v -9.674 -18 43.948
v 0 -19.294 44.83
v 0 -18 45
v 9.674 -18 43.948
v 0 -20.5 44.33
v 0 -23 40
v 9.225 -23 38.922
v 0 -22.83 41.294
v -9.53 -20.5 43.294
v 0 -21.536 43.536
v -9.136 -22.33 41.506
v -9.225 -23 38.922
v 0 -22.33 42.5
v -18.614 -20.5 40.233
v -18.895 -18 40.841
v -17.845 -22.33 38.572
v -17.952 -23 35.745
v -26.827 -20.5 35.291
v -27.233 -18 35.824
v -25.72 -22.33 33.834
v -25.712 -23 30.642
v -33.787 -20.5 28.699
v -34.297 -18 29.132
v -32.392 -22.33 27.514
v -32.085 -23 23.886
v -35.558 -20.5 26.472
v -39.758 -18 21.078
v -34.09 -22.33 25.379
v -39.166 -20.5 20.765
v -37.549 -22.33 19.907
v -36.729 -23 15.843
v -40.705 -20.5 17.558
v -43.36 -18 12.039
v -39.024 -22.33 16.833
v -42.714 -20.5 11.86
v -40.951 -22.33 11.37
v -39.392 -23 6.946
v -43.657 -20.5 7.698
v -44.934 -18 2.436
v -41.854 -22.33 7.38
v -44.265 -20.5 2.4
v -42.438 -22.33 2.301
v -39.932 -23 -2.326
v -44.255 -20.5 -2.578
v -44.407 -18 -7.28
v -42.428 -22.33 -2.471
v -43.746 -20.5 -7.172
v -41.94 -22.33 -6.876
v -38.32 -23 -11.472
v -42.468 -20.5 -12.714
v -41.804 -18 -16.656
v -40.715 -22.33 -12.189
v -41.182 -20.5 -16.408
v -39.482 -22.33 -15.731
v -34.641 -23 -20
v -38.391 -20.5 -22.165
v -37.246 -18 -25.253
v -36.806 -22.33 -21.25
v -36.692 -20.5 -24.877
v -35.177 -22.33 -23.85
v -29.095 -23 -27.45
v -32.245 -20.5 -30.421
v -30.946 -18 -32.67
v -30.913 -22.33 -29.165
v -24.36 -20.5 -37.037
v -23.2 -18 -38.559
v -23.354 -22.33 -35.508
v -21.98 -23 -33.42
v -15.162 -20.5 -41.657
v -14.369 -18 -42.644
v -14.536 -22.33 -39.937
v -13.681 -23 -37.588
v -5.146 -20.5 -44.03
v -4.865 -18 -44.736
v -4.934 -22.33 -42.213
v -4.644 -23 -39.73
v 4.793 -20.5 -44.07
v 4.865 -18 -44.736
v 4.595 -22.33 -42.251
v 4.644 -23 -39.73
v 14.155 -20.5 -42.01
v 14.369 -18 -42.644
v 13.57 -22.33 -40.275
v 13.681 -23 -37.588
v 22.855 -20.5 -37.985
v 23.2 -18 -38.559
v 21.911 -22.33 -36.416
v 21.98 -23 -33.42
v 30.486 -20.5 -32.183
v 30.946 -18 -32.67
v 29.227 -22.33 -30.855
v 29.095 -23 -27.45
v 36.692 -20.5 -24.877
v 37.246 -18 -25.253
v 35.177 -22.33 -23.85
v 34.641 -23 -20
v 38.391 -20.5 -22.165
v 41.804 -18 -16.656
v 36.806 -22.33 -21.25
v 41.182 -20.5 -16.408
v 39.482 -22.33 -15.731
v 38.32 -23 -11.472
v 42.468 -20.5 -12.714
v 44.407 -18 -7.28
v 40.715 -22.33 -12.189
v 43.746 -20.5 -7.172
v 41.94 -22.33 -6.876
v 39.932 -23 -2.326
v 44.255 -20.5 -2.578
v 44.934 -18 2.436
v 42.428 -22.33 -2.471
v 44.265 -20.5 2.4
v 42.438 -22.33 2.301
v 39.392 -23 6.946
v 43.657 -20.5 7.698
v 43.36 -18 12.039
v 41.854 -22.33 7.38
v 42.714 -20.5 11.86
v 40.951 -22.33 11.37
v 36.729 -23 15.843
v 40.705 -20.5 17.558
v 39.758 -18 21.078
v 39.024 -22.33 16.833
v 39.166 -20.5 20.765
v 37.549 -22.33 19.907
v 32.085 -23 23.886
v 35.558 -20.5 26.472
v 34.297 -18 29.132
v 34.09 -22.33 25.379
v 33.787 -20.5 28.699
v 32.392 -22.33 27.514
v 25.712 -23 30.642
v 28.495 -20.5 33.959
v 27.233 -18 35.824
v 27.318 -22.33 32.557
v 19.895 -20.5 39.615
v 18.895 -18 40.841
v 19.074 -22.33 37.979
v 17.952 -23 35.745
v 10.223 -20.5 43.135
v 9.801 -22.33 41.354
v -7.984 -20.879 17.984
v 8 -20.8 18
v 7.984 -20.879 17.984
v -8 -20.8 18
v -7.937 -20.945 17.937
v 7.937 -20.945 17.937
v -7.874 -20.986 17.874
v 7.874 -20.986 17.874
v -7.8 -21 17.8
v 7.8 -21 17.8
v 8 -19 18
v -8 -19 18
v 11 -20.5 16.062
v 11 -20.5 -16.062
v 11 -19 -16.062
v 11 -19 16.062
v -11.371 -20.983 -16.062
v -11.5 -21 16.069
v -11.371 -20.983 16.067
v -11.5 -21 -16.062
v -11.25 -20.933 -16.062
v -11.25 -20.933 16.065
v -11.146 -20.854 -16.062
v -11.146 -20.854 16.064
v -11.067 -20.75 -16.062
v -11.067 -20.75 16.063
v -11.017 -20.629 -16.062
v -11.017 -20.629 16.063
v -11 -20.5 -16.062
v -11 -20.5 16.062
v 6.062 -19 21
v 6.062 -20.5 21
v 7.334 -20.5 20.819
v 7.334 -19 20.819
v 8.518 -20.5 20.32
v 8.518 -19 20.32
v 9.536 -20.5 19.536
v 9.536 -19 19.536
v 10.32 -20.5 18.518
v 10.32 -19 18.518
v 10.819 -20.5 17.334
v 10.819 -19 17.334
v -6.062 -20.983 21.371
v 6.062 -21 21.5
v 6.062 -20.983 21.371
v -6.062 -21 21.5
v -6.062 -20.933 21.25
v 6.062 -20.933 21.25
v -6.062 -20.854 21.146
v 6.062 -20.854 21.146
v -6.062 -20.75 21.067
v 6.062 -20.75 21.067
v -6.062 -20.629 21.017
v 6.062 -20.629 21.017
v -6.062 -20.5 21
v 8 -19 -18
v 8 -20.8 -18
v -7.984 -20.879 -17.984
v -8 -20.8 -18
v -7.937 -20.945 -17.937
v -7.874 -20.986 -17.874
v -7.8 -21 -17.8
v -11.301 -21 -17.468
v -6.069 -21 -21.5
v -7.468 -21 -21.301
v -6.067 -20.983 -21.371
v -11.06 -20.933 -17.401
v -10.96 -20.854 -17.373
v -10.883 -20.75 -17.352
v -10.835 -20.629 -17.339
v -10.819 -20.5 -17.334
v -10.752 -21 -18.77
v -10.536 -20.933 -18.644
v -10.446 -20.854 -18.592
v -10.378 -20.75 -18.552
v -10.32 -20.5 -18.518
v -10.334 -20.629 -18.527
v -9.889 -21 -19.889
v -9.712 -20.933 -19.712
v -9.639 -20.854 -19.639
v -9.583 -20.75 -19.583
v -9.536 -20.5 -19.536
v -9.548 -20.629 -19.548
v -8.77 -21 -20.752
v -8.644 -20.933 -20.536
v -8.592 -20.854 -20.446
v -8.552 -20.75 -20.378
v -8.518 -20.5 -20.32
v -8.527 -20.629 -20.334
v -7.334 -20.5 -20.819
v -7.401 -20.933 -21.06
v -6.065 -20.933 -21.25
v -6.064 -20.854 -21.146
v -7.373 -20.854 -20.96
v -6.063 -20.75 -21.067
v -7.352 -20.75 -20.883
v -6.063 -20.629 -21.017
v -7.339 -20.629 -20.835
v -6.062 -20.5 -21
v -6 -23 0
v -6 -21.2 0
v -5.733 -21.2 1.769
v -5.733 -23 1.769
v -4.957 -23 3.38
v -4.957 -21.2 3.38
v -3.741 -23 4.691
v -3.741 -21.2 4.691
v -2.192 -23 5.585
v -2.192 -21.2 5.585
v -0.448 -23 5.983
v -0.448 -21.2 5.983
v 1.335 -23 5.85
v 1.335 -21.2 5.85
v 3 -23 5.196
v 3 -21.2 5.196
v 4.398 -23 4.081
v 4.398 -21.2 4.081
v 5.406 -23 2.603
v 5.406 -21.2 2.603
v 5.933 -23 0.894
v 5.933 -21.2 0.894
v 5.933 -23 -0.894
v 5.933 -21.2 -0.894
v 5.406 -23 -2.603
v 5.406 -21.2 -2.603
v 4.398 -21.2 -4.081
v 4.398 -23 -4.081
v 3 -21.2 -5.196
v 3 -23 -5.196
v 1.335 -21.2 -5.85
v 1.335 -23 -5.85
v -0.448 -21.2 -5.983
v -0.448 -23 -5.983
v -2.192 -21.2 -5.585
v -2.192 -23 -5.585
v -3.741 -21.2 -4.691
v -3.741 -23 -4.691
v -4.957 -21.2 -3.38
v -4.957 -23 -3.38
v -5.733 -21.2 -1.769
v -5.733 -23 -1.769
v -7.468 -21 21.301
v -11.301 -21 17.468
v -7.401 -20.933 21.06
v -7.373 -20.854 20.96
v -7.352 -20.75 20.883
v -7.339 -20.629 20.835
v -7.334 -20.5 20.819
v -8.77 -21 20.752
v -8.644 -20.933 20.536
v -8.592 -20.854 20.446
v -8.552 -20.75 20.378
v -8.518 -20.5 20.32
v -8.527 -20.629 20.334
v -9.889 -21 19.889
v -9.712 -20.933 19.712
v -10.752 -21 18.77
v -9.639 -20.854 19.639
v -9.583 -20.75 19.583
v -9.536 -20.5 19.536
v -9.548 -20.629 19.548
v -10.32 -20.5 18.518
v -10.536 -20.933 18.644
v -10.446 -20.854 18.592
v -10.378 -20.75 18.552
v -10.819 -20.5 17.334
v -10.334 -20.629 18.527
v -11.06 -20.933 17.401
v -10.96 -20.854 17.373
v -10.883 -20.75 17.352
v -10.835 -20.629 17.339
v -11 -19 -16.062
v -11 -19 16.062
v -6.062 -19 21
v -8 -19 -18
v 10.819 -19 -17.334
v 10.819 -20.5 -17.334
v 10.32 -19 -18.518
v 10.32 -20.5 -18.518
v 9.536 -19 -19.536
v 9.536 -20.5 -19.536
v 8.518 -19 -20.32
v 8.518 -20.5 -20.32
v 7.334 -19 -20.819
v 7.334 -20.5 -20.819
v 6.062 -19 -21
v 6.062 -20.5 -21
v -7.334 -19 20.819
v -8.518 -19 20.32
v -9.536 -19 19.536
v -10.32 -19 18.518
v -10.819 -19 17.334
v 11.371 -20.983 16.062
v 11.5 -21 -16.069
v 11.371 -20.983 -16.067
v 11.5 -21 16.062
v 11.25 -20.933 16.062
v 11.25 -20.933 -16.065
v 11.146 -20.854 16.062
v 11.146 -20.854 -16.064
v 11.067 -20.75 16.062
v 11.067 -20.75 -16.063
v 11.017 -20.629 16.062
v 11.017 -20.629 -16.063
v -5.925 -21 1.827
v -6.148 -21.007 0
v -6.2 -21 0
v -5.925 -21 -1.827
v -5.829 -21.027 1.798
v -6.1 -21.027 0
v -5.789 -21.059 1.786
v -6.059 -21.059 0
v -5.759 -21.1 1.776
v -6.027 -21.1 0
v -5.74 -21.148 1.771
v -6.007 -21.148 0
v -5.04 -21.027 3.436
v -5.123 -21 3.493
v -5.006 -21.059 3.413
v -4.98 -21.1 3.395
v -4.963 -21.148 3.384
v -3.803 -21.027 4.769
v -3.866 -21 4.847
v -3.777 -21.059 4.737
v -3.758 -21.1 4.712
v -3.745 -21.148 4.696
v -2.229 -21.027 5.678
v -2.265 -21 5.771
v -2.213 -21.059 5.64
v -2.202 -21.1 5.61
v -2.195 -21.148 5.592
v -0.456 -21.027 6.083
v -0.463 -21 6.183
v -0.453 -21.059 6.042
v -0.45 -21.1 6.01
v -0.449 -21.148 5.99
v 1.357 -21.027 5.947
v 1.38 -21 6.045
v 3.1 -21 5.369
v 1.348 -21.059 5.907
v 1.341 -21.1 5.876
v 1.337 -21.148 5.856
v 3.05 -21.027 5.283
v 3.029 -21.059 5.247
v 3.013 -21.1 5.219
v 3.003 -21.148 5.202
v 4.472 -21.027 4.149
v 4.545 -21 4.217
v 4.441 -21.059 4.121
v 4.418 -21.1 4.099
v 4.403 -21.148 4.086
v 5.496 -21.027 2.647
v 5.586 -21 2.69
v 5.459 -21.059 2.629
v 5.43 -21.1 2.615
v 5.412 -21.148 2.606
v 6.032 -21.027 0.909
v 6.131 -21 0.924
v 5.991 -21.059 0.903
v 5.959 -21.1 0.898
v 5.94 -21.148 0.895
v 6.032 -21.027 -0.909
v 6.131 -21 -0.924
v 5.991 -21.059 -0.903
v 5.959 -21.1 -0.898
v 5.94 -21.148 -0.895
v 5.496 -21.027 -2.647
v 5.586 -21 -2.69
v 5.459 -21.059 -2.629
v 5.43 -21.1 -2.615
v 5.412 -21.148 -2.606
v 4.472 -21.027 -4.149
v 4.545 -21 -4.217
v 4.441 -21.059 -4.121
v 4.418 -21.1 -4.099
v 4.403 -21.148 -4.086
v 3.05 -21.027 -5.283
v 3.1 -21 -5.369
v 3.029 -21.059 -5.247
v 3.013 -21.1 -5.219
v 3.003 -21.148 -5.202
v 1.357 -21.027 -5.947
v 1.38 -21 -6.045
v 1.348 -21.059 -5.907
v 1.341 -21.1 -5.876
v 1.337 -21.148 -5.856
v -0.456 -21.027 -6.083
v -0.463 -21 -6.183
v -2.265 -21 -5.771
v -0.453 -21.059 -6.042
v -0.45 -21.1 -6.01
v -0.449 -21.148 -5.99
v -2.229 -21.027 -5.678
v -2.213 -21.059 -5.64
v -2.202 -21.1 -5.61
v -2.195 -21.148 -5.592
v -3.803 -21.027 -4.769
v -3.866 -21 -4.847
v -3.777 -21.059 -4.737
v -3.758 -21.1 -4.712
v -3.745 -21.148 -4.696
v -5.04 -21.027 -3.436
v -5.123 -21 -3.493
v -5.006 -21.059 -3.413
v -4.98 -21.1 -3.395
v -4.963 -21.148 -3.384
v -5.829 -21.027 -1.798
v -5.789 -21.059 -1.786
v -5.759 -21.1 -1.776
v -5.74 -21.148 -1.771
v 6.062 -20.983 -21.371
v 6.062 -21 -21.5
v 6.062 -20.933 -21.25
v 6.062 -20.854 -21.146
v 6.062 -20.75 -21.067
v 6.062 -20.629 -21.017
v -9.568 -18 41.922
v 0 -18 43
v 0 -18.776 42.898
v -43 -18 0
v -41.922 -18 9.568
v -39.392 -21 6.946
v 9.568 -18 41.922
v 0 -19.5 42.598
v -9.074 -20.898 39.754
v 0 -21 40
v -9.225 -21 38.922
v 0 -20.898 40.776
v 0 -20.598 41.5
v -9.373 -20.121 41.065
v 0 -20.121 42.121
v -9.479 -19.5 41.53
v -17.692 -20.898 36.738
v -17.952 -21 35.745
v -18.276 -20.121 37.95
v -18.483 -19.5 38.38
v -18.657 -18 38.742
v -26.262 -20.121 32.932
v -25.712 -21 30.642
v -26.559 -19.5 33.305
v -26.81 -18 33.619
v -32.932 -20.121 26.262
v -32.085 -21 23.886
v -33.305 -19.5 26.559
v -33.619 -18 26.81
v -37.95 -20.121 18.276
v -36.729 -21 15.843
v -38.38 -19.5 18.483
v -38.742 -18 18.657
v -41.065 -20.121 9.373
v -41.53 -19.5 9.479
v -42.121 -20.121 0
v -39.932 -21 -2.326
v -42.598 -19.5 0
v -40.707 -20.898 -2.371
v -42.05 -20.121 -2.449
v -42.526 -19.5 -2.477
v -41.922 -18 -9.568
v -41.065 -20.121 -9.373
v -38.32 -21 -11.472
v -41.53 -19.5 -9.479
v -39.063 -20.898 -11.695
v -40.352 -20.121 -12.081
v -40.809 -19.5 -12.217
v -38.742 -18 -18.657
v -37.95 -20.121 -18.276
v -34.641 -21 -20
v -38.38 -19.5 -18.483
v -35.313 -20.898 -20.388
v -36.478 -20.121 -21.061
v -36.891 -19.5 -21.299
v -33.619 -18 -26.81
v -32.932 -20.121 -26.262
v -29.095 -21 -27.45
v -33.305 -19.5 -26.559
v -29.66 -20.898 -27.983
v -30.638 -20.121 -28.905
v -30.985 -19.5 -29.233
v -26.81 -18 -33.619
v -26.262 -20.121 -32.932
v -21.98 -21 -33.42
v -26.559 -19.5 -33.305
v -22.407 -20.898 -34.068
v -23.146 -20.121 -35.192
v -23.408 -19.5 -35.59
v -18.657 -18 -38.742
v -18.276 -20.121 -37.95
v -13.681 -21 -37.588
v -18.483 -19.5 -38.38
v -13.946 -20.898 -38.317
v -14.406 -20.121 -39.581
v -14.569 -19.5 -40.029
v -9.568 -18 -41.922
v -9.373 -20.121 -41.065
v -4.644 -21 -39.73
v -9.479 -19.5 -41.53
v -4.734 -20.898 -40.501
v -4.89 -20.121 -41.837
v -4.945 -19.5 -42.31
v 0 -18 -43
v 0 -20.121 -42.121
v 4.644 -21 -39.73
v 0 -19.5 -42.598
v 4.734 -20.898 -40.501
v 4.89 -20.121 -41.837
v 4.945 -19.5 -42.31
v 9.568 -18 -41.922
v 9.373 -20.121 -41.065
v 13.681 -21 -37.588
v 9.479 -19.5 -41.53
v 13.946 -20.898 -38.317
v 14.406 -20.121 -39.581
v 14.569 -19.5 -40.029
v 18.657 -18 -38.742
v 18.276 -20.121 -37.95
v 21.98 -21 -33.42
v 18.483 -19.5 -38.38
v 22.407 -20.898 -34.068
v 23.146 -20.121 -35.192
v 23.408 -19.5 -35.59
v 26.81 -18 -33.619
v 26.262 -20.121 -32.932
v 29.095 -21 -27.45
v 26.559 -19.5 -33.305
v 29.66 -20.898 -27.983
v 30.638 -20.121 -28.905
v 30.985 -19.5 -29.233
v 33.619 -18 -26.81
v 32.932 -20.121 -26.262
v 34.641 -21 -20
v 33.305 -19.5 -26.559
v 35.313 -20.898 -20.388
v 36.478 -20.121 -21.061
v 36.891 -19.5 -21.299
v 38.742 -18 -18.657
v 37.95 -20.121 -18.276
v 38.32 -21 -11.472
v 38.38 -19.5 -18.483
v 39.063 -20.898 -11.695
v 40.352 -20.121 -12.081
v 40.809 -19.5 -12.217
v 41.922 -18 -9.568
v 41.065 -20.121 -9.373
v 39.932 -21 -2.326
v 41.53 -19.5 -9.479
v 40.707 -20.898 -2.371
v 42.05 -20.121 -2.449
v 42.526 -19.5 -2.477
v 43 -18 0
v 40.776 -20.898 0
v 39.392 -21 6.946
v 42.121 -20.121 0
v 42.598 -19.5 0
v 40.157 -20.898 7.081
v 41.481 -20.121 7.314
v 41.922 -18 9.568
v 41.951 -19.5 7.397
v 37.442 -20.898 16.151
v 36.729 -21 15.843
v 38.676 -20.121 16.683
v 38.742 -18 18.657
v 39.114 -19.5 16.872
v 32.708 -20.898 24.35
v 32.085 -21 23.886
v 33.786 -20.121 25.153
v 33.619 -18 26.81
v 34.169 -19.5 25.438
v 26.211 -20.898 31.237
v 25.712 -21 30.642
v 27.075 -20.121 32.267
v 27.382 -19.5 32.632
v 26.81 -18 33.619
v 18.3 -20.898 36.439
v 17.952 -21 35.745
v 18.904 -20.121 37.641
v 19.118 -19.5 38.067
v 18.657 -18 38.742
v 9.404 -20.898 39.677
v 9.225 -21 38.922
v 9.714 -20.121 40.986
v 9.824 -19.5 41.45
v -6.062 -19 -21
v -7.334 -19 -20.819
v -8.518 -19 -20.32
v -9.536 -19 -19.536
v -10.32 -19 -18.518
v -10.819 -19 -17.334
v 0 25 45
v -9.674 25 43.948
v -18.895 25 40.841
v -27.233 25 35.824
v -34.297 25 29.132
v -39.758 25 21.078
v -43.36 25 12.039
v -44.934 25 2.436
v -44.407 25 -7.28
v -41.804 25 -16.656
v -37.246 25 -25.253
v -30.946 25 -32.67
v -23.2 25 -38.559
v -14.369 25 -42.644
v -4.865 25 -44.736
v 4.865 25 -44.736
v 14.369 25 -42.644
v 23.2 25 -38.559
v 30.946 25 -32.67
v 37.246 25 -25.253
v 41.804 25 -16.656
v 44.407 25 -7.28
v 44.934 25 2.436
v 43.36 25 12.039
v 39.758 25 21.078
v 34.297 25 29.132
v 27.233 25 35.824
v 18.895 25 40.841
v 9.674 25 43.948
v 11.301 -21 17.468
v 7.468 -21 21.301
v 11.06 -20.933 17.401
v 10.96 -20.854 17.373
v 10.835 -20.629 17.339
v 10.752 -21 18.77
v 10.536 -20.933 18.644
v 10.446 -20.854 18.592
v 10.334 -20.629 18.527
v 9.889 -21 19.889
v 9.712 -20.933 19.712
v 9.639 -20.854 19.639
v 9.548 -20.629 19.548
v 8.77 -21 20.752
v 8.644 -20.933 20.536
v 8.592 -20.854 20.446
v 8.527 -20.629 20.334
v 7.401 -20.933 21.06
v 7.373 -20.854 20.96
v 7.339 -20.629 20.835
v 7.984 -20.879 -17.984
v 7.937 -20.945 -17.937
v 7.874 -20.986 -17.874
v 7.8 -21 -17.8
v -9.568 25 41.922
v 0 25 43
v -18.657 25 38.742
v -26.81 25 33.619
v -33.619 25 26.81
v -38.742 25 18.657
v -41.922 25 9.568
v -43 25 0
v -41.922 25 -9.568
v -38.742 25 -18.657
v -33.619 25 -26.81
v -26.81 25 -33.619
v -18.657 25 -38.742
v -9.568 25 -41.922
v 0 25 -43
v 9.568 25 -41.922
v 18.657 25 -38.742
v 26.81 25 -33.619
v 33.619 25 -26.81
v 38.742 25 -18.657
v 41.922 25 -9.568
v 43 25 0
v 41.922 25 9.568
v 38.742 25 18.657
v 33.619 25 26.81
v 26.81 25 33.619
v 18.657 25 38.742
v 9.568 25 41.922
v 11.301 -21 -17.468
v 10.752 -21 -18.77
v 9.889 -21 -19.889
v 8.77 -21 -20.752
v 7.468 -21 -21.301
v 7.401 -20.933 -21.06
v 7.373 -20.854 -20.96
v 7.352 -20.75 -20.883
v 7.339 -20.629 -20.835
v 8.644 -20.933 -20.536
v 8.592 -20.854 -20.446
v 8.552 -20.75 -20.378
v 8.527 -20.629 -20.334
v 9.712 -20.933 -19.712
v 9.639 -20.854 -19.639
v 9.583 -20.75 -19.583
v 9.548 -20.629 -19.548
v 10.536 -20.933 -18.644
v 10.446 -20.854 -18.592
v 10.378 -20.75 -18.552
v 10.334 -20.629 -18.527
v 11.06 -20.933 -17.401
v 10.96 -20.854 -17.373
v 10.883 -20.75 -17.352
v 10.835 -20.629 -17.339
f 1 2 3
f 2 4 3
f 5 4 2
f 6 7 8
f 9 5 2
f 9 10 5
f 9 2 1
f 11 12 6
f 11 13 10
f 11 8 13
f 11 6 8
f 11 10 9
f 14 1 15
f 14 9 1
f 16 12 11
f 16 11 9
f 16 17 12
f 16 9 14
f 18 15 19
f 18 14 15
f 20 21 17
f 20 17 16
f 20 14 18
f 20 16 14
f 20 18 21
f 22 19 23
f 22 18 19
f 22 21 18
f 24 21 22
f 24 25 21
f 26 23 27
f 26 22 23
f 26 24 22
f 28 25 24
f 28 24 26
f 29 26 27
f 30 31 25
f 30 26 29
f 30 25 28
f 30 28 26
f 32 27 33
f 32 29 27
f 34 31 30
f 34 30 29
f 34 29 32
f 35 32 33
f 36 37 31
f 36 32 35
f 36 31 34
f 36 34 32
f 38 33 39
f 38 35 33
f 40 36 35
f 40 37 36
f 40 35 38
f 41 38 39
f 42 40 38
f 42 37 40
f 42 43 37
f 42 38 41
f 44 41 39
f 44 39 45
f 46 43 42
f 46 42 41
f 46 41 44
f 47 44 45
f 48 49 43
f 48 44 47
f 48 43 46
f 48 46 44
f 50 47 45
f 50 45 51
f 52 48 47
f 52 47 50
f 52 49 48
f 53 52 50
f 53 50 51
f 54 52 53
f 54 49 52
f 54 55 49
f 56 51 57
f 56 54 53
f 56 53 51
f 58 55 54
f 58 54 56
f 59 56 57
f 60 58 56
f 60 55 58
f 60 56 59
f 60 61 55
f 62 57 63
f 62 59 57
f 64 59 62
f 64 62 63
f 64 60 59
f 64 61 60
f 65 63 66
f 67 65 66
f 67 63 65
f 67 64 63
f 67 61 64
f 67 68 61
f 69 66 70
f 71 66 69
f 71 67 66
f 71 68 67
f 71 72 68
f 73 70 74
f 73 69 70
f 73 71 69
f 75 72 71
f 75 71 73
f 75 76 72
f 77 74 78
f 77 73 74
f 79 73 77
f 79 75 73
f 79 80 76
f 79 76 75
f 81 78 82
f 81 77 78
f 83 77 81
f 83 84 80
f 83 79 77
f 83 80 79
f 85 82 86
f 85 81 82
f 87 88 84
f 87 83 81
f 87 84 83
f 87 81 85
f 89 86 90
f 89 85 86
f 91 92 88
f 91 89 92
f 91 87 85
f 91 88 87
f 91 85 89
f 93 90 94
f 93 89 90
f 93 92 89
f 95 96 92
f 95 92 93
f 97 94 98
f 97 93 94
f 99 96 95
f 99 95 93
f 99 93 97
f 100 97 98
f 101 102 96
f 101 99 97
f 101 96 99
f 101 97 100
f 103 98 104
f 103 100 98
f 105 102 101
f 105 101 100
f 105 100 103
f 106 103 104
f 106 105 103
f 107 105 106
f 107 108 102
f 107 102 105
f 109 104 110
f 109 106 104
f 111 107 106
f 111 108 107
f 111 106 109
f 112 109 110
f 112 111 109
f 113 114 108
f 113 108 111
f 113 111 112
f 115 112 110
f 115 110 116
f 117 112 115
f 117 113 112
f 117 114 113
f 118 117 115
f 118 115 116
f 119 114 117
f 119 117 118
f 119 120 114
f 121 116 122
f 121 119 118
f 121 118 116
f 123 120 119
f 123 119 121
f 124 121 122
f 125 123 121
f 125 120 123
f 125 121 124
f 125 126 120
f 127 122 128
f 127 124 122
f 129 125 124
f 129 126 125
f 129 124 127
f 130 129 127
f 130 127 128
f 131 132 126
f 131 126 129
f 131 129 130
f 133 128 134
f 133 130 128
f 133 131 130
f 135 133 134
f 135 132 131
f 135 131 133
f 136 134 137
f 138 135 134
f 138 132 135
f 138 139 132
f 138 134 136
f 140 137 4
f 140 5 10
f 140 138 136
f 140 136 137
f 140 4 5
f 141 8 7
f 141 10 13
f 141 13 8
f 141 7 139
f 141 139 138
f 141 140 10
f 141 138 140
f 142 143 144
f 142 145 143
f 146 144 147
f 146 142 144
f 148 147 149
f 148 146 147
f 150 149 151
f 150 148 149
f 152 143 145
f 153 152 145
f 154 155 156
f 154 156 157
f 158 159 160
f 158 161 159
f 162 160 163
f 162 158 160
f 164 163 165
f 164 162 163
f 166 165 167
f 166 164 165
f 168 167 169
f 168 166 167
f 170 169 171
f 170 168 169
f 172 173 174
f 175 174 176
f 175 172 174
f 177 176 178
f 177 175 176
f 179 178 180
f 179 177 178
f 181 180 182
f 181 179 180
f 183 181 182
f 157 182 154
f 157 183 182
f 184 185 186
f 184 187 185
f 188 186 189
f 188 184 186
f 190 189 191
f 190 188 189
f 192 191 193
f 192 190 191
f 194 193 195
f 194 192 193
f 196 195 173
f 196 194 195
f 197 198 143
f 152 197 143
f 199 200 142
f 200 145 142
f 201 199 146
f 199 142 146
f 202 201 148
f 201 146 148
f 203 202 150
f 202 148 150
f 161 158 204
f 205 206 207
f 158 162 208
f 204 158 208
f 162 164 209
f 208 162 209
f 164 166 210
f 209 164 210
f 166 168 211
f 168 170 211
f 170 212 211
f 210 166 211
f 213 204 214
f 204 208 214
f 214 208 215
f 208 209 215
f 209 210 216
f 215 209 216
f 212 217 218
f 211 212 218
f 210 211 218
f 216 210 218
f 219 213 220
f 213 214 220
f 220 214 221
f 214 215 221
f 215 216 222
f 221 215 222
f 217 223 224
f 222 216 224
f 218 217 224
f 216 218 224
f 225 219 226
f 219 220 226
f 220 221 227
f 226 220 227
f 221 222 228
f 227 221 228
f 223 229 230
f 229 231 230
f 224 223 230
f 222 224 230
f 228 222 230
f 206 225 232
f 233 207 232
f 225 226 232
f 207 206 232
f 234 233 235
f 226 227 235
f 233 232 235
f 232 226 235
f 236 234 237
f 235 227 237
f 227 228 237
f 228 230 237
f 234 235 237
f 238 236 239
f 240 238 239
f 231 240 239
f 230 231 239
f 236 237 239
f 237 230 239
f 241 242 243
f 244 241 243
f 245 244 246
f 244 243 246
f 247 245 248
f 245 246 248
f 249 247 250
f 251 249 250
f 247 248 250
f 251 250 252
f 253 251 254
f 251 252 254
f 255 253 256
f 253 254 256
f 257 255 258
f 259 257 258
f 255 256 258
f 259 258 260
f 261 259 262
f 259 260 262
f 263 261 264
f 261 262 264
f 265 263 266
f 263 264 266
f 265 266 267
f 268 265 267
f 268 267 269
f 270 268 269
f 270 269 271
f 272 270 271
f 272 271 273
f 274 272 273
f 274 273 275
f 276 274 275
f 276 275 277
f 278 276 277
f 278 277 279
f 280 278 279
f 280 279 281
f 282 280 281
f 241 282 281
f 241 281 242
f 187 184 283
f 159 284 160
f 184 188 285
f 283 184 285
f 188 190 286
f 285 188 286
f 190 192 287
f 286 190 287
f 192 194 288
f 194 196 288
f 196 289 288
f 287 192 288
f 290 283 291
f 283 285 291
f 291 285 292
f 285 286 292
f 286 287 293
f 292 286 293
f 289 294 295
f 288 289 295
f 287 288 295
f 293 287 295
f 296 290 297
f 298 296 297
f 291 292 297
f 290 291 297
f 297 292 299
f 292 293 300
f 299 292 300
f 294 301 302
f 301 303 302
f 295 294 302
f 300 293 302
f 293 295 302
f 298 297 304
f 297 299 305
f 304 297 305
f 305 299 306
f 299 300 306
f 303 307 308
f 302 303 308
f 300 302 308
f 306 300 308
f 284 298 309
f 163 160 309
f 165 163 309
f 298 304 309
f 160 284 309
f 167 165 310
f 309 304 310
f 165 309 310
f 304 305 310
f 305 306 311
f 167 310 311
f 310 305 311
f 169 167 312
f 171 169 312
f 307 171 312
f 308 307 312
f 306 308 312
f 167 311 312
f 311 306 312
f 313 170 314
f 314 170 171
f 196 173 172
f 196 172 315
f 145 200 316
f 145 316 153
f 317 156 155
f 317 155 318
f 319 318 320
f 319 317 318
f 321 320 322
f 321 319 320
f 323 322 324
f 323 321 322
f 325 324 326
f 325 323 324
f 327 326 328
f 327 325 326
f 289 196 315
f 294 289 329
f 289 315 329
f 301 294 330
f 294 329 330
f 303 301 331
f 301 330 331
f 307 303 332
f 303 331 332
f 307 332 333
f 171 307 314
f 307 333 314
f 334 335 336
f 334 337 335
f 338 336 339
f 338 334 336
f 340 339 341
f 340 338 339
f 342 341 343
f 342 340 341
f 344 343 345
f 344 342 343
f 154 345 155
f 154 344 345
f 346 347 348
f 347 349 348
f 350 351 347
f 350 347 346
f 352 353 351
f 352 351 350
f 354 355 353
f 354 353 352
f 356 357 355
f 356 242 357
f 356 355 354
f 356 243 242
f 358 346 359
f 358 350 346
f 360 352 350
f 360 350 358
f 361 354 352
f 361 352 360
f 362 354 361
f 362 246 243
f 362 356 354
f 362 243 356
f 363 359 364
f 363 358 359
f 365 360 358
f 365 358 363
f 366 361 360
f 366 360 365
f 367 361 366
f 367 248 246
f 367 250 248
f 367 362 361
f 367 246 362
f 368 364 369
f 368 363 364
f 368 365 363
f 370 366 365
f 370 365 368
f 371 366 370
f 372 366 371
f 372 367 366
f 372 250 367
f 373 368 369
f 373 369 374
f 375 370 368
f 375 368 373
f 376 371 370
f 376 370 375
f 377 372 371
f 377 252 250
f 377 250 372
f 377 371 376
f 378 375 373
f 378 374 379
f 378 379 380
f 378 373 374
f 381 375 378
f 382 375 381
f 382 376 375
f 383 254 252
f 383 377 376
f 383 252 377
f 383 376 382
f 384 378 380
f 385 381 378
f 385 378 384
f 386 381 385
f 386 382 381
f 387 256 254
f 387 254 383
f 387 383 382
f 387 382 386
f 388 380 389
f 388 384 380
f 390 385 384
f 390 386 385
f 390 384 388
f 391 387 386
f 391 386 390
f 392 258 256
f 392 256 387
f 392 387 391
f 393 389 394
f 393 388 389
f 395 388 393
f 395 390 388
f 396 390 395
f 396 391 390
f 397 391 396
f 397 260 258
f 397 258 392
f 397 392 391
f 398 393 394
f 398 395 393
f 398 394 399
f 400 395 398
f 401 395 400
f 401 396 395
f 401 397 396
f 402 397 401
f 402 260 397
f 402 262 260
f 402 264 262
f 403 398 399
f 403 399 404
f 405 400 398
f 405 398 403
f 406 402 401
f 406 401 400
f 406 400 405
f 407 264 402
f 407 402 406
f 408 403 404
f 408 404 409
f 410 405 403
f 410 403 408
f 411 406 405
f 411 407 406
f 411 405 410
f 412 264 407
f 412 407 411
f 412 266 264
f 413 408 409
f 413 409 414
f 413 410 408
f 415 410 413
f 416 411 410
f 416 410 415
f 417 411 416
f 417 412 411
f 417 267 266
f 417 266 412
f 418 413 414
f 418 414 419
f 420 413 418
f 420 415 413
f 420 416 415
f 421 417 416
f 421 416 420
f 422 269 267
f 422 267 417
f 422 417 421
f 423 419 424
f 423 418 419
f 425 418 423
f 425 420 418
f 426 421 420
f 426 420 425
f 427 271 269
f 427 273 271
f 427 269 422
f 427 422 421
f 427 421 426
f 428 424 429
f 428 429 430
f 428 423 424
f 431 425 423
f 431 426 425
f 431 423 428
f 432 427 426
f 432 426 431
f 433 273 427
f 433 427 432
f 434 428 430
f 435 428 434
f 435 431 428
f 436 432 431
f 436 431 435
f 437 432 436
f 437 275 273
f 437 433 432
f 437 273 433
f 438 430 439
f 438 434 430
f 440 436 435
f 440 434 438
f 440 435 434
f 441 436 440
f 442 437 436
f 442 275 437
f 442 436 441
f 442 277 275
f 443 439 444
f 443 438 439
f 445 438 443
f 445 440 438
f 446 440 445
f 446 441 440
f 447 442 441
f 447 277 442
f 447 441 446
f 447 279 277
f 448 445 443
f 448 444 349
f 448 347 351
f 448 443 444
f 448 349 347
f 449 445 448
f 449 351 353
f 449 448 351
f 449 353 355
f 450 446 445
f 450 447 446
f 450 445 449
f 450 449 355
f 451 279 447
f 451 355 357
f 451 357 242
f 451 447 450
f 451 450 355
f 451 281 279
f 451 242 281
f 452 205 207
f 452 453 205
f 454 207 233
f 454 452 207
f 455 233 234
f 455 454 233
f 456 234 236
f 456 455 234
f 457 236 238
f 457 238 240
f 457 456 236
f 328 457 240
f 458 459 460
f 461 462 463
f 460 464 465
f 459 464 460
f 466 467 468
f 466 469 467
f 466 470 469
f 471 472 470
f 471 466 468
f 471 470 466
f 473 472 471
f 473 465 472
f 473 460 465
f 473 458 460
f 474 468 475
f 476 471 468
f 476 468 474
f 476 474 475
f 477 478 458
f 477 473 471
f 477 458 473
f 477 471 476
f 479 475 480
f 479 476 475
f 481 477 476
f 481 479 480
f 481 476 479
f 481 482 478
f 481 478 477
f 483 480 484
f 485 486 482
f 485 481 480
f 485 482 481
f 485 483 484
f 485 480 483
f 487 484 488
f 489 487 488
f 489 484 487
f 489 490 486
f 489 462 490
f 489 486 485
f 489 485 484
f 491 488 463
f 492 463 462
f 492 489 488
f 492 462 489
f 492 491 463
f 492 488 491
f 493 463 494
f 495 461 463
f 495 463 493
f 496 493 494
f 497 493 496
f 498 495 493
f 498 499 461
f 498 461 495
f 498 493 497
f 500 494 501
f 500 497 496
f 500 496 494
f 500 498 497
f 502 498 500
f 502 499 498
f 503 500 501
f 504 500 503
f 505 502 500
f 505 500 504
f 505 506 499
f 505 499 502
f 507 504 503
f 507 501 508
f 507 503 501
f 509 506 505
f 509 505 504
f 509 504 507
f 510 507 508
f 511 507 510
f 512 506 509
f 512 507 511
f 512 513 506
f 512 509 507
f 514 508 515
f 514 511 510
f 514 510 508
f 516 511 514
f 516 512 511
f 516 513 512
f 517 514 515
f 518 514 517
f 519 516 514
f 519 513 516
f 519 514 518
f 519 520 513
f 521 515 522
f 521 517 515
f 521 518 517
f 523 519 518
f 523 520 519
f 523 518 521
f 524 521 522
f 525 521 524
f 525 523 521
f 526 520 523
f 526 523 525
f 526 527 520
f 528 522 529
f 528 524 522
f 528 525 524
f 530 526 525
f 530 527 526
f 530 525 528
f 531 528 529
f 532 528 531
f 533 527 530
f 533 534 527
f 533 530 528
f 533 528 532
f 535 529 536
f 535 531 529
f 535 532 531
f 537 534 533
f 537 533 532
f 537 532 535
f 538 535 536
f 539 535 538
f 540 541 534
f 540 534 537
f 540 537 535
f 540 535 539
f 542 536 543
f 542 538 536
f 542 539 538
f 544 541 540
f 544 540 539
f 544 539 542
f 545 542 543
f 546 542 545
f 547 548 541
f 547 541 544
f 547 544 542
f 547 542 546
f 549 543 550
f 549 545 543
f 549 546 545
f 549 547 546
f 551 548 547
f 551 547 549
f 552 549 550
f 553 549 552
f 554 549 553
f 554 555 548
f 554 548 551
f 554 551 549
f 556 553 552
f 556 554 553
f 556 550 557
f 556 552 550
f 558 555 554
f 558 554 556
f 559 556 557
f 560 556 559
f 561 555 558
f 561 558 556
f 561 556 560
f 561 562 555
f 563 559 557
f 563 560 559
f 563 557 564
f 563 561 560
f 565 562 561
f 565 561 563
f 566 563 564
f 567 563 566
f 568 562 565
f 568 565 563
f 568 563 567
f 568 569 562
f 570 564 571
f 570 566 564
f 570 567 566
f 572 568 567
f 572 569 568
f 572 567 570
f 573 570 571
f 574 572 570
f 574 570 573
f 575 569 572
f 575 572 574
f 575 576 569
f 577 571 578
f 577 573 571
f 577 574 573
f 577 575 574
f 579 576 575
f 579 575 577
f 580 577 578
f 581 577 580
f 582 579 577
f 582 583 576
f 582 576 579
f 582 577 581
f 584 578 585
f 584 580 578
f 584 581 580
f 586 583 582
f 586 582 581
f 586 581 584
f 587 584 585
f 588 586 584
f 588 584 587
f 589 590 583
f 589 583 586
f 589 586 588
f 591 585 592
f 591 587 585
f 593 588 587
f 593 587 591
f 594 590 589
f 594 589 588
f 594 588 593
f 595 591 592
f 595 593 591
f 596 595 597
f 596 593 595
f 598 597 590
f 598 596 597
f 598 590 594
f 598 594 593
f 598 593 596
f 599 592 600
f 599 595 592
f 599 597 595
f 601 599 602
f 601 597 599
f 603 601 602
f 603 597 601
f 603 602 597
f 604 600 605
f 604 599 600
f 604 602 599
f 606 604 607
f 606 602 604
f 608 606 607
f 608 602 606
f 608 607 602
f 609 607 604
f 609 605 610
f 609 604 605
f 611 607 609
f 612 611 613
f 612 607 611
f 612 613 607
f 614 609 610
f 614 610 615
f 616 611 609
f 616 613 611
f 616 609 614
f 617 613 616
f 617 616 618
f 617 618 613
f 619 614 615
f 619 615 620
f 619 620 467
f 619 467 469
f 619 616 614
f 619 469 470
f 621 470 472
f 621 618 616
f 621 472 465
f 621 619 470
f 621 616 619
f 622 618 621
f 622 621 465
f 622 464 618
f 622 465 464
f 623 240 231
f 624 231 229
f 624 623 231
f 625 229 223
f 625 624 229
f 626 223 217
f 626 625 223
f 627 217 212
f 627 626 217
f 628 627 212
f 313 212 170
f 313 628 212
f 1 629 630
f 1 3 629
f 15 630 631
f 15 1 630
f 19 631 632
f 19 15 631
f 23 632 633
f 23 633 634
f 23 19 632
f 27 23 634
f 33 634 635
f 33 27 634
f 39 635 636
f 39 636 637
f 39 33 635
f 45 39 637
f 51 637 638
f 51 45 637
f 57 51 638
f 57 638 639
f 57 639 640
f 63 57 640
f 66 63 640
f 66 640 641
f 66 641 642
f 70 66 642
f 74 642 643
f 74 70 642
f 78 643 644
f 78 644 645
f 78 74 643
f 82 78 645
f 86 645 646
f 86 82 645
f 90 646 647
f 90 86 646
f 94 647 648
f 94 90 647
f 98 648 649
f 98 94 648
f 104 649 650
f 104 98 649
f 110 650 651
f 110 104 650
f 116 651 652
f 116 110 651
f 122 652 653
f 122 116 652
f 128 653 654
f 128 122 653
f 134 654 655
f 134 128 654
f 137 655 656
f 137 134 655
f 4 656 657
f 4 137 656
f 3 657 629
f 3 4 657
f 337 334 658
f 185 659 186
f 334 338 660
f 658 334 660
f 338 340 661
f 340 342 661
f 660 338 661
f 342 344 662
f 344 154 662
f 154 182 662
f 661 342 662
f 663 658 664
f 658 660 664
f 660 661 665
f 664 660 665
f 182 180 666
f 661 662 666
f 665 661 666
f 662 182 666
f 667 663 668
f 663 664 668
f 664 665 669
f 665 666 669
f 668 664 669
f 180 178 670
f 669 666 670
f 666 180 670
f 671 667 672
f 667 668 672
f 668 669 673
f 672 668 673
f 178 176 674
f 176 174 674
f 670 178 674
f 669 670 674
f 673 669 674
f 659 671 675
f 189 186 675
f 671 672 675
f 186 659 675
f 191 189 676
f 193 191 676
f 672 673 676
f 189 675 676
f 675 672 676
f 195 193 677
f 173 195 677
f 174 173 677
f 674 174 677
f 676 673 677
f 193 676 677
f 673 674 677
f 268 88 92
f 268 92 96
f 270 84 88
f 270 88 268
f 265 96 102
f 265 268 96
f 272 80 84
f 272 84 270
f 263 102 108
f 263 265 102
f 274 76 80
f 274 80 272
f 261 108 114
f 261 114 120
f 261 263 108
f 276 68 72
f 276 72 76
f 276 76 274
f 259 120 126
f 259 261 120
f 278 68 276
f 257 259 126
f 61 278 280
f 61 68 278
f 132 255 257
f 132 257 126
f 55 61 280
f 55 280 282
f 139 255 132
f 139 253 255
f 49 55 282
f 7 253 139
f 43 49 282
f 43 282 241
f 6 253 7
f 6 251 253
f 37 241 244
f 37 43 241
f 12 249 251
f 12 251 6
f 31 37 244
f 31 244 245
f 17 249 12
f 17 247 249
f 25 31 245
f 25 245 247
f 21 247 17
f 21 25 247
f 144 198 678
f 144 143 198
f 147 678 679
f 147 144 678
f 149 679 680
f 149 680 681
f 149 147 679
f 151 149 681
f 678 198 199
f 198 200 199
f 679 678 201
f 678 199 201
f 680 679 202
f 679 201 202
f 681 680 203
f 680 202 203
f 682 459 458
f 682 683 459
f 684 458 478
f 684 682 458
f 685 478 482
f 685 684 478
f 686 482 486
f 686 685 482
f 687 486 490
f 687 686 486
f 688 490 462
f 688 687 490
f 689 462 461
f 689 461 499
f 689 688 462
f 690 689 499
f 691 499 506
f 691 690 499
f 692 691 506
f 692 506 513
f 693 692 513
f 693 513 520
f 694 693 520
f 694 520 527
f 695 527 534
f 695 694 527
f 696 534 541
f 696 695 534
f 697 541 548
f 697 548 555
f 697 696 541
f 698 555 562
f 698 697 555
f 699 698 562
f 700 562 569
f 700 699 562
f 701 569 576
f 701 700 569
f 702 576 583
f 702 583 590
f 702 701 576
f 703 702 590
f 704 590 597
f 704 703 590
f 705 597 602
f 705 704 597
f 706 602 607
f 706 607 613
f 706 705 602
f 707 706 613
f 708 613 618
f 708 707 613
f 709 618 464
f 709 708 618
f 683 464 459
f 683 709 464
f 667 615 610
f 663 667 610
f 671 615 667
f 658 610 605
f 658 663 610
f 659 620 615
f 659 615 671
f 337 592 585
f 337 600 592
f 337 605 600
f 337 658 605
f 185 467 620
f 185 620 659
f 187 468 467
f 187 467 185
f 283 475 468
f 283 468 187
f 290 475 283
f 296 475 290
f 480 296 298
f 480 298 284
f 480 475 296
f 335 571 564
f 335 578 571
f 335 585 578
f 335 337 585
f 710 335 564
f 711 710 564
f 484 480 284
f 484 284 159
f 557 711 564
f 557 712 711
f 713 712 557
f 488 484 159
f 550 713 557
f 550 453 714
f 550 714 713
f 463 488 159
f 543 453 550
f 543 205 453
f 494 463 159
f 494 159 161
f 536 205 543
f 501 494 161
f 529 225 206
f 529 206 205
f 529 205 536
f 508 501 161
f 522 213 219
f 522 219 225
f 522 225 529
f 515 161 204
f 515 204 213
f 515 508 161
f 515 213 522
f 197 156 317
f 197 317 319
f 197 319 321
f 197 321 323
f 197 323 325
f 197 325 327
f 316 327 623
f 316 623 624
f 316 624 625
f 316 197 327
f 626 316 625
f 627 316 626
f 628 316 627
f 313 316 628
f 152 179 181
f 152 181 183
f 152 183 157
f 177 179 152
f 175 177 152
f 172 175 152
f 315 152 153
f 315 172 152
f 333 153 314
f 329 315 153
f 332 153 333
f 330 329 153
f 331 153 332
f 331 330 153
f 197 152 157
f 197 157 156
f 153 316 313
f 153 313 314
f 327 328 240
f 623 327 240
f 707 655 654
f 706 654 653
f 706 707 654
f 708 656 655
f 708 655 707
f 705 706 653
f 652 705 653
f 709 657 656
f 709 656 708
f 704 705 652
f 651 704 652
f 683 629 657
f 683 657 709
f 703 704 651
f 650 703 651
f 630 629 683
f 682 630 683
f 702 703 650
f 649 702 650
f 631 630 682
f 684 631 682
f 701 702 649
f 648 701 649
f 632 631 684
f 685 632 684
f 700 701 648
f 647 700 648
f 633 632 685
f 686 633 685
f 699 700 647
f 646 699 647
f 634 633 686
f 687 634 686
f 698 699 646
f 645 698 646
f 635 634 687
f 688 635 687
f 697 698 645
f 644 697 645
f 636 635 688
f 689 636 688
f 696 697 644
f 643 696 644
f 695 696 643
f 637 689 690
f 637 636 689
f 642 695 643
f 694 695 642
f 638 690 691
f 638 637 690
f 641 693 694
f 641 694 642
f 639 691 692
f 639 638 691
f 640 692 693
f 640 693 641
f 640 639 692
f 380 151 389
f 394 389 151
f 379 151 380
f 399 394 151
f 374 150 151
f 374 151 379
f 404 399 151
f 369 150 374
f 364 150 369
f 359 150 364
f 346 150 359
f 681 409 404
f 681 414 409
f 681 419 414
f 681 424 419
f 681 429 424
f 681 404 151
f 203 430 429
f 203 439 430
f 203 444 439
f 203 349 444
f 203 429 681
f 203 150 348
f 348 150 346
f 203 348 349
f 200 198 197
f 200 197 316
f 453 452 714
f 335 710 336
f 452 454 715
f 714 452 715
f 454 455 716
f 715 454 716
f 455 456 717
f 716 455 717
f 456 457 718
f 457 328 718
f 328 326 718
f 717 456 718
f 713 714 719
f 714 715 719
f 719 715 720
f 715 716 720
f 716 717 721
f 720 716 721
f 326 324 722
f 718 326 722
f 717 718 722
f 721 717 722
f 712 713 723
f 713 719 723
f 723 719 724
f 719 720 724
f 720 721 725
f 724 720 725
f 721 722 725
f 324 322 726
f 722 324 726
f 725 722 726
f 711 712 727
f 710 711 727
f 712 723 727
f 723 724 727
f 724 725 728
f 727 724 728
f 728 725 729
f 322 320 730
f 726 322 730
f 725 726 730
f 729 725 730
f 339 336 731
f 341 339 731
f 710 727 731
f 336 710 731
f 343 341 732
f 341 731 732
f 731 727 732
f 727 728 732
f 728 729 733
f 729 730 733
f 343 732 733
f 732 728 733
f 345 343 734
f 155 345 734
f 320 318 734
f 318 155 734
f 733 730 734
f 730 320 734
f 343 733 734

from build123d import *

# Parameters (mm, degrees)
F2_W        = 22
F2_H        = 42
F2_W_2      = 16
F2_H_2      = 36
F3_DEPTH    = 2
F2_R        = 6
F4_DEPTH    = 25
F5_T1_DEPTH = 14.5024142536
F6_R        = 0.5
F7_R        = 0.2


# Not quite as in the source:
# - a fillet or chamfer that OpenCascade refuses, or shapes differently, is made with other operations: its cross-section is extruded or revolved along the edge and cut away or added


with BuildPart() as f1:
    # F0 (on Right) → F1 (revolve)
    with BuildSketch(Plane.YZ):
        with BuildLine():
            Line((-23, 0), (-21, 0))
            Line((-21, 0), (-21, 32.1))
            Line((-21, 32.1), (-21, 34.1))
            Line((-21, 34.1), (-21, 40))
            ThreePointArc((-21, 40), (-20.1213203436, 42.1213203436), (-18, 43))
            Line((-18, 43), (15, 43))
            Line((15, 43), (17, 43))
            Line((17, 43), (23, 43))
            Line((23, 43), (25, 43))
            Line((25, 43), (25, 45))
            Line((25, 45), (-18, 45))
            ThreePointArc((-18, 45), (-21.5355339059, 43.5355339059), (-23, 40))
            Line((-23, 40), (-23, 0))
        make_face()
    revolve(axis=Axis((0, -22, 0), (0, -1, 0)))

    # F2 (on face) → F3 (join)
    with BuildSketch(Plane(origin=(0, -21, 0), x_dir=(-1, 0, 0), z_dir=(0, 1, 0))):
        Rectangle(F2_W, F2_H)
        Rectangle(F2_W_2, F2_H_2, mode=Mode.SUBTRACT)
    extrude(amount=F3_DEPTH)

    # F2 (on face) → F4 (cut)
    with BuildSketch(Plane(origin=(0, -21, 0), x_dir=(-1, 0, 0), z_dir=(0, 1, 0))):
        Circle(F2_R)
    extrude(amount=-F4_DEPTH, mode=Mode.SUBTRACT)

    # F5: fillet of radius 5 on 4 edges, made by hand

    # F5_s2 → F5_t1 (cut)
    with BuildSketch(Plane.XZ.offset(6.4975857464)):
        with BuildLine():
            ThreePointArc((5.9990343146, 21.0004), (9.5355339059, 19.5355339059), (11.0004, 15.9990343146))
            Line((11.0004, 15.9990343146), (11.5005365685, 15.9990343146))
            ThreePointArc((11.5005365685, 15.9990343146), (11.5001365685, 18.4995171573), (11.5001365685, 21))
            Line((11.5001365685, 21), (11, 21.5001365685))
            ThreePointArc((11, 21.5001365685), (8.4995171573, 21.5001365685), (5.9990343146, 21.5005365685))
            Line((5.9990343146, 21.5005365685), (5.9990343146, 21.0004))
        make_face()
        with BuildLine():
            ThreePointArc((-5.9990343146, 21.0004), (-9.5355339059, 19.5355339059), (-11.0004, 15.9990343146))
            Line((-11.0004, 15.9990343146), (-11.5005365685, 15.9990343146))
            ThreePointArc((-11.5005365685, 15.9990343146), (-11.5001365685, 18.4995171573), (-11.5001365685, 21))
            Line((-11.5001365685, 21), (-11, 21.5001365685))
            ThreePointArc((-11, 21.5001365685), (-8.4995171573, 21.5001365685), (-5.9990343146, 21.5005365685))
            Line((-5.9990343146, 21.5005365685), (-5.9990343146, 21.0004))
        make_face()
        with BuildLine():
            ThreePointArc((-5.9990343146, -21.0004), (-9.5355339059, -19.5355339059), (-11.0004, -15.9990343146))
            Line((-11.0004, -15.9990343146), (-11.5005365685, -15.9990343146))
            ThreePointArc((-11.5005365685, -15.9990343146), (-11.5001365685, -18.4995171573), (-11.5001365685, -21))
            Line((-11.5001365685, -21), (-11, -21.5001365685))
            ThreePointArc((-11, -21.5001365685), (-8.4995171573, -21.5001365685), (-5.9990343146, -21.5005365685))
            Line((-5.9990343146, -21.5005365685), (-5.9990343146, -21.0004))
        make_face()
        with BuildLine():
            ThreePointArc((11.0004, -15.9990343146), (9.5355339059, -19.5355339059), (5.9990343146, -21.0004))
            Line((5.9990343146, -21.0004), (5.9990343146, -21.5005365685))
            ThreePointArc((5.9990343146, -21.5005365685), (8.4995171573, -21.5001365685), (11, -21.5001365685))
            Line((11, -21.5001365685), (11.5001365685, -21))
            ThreePointArc((11.5001365685, -21), (11.5001365685, -18.4995171573), (11.5005365685, -15.9990343146))
            Line((11.5005365685, -15.9990343146), (11.0004, -15.9990343146))
        make_face()
    extrude(amount=F5_T1_DEPTH, mode=Mode.SUBTRACT)

    # F6
    f6_edges = [f1.edges().sort_by_distance(p)[0] for p in [
        (0, -21, -40),
        (0, -21, 21),
        (-9.535534, -21, 19.535534),
        (-11, -21, 0),
        (-9.535534, -21, -19.535534),
        (0, -21, -21),
        (9.535534, -21, -19.535534),
        (11, -21, 0),
        (9.535534, -21, 19.535534),
    ]]
    fillet(f6_edges, radius=F6_R)

    # F7
    f7_edges = [f1.edges().sort_by_distance(p)[0] for p in [
        (8, -21, 0),
        (0, -21, -18),
        (0, -21, 18),
        (-8, -21, 0),
        (6, -21, 0),
        (0, -21, -40),
    ]]
    fillet(f7_edges, radius=F7_R)


solid = f1.part
